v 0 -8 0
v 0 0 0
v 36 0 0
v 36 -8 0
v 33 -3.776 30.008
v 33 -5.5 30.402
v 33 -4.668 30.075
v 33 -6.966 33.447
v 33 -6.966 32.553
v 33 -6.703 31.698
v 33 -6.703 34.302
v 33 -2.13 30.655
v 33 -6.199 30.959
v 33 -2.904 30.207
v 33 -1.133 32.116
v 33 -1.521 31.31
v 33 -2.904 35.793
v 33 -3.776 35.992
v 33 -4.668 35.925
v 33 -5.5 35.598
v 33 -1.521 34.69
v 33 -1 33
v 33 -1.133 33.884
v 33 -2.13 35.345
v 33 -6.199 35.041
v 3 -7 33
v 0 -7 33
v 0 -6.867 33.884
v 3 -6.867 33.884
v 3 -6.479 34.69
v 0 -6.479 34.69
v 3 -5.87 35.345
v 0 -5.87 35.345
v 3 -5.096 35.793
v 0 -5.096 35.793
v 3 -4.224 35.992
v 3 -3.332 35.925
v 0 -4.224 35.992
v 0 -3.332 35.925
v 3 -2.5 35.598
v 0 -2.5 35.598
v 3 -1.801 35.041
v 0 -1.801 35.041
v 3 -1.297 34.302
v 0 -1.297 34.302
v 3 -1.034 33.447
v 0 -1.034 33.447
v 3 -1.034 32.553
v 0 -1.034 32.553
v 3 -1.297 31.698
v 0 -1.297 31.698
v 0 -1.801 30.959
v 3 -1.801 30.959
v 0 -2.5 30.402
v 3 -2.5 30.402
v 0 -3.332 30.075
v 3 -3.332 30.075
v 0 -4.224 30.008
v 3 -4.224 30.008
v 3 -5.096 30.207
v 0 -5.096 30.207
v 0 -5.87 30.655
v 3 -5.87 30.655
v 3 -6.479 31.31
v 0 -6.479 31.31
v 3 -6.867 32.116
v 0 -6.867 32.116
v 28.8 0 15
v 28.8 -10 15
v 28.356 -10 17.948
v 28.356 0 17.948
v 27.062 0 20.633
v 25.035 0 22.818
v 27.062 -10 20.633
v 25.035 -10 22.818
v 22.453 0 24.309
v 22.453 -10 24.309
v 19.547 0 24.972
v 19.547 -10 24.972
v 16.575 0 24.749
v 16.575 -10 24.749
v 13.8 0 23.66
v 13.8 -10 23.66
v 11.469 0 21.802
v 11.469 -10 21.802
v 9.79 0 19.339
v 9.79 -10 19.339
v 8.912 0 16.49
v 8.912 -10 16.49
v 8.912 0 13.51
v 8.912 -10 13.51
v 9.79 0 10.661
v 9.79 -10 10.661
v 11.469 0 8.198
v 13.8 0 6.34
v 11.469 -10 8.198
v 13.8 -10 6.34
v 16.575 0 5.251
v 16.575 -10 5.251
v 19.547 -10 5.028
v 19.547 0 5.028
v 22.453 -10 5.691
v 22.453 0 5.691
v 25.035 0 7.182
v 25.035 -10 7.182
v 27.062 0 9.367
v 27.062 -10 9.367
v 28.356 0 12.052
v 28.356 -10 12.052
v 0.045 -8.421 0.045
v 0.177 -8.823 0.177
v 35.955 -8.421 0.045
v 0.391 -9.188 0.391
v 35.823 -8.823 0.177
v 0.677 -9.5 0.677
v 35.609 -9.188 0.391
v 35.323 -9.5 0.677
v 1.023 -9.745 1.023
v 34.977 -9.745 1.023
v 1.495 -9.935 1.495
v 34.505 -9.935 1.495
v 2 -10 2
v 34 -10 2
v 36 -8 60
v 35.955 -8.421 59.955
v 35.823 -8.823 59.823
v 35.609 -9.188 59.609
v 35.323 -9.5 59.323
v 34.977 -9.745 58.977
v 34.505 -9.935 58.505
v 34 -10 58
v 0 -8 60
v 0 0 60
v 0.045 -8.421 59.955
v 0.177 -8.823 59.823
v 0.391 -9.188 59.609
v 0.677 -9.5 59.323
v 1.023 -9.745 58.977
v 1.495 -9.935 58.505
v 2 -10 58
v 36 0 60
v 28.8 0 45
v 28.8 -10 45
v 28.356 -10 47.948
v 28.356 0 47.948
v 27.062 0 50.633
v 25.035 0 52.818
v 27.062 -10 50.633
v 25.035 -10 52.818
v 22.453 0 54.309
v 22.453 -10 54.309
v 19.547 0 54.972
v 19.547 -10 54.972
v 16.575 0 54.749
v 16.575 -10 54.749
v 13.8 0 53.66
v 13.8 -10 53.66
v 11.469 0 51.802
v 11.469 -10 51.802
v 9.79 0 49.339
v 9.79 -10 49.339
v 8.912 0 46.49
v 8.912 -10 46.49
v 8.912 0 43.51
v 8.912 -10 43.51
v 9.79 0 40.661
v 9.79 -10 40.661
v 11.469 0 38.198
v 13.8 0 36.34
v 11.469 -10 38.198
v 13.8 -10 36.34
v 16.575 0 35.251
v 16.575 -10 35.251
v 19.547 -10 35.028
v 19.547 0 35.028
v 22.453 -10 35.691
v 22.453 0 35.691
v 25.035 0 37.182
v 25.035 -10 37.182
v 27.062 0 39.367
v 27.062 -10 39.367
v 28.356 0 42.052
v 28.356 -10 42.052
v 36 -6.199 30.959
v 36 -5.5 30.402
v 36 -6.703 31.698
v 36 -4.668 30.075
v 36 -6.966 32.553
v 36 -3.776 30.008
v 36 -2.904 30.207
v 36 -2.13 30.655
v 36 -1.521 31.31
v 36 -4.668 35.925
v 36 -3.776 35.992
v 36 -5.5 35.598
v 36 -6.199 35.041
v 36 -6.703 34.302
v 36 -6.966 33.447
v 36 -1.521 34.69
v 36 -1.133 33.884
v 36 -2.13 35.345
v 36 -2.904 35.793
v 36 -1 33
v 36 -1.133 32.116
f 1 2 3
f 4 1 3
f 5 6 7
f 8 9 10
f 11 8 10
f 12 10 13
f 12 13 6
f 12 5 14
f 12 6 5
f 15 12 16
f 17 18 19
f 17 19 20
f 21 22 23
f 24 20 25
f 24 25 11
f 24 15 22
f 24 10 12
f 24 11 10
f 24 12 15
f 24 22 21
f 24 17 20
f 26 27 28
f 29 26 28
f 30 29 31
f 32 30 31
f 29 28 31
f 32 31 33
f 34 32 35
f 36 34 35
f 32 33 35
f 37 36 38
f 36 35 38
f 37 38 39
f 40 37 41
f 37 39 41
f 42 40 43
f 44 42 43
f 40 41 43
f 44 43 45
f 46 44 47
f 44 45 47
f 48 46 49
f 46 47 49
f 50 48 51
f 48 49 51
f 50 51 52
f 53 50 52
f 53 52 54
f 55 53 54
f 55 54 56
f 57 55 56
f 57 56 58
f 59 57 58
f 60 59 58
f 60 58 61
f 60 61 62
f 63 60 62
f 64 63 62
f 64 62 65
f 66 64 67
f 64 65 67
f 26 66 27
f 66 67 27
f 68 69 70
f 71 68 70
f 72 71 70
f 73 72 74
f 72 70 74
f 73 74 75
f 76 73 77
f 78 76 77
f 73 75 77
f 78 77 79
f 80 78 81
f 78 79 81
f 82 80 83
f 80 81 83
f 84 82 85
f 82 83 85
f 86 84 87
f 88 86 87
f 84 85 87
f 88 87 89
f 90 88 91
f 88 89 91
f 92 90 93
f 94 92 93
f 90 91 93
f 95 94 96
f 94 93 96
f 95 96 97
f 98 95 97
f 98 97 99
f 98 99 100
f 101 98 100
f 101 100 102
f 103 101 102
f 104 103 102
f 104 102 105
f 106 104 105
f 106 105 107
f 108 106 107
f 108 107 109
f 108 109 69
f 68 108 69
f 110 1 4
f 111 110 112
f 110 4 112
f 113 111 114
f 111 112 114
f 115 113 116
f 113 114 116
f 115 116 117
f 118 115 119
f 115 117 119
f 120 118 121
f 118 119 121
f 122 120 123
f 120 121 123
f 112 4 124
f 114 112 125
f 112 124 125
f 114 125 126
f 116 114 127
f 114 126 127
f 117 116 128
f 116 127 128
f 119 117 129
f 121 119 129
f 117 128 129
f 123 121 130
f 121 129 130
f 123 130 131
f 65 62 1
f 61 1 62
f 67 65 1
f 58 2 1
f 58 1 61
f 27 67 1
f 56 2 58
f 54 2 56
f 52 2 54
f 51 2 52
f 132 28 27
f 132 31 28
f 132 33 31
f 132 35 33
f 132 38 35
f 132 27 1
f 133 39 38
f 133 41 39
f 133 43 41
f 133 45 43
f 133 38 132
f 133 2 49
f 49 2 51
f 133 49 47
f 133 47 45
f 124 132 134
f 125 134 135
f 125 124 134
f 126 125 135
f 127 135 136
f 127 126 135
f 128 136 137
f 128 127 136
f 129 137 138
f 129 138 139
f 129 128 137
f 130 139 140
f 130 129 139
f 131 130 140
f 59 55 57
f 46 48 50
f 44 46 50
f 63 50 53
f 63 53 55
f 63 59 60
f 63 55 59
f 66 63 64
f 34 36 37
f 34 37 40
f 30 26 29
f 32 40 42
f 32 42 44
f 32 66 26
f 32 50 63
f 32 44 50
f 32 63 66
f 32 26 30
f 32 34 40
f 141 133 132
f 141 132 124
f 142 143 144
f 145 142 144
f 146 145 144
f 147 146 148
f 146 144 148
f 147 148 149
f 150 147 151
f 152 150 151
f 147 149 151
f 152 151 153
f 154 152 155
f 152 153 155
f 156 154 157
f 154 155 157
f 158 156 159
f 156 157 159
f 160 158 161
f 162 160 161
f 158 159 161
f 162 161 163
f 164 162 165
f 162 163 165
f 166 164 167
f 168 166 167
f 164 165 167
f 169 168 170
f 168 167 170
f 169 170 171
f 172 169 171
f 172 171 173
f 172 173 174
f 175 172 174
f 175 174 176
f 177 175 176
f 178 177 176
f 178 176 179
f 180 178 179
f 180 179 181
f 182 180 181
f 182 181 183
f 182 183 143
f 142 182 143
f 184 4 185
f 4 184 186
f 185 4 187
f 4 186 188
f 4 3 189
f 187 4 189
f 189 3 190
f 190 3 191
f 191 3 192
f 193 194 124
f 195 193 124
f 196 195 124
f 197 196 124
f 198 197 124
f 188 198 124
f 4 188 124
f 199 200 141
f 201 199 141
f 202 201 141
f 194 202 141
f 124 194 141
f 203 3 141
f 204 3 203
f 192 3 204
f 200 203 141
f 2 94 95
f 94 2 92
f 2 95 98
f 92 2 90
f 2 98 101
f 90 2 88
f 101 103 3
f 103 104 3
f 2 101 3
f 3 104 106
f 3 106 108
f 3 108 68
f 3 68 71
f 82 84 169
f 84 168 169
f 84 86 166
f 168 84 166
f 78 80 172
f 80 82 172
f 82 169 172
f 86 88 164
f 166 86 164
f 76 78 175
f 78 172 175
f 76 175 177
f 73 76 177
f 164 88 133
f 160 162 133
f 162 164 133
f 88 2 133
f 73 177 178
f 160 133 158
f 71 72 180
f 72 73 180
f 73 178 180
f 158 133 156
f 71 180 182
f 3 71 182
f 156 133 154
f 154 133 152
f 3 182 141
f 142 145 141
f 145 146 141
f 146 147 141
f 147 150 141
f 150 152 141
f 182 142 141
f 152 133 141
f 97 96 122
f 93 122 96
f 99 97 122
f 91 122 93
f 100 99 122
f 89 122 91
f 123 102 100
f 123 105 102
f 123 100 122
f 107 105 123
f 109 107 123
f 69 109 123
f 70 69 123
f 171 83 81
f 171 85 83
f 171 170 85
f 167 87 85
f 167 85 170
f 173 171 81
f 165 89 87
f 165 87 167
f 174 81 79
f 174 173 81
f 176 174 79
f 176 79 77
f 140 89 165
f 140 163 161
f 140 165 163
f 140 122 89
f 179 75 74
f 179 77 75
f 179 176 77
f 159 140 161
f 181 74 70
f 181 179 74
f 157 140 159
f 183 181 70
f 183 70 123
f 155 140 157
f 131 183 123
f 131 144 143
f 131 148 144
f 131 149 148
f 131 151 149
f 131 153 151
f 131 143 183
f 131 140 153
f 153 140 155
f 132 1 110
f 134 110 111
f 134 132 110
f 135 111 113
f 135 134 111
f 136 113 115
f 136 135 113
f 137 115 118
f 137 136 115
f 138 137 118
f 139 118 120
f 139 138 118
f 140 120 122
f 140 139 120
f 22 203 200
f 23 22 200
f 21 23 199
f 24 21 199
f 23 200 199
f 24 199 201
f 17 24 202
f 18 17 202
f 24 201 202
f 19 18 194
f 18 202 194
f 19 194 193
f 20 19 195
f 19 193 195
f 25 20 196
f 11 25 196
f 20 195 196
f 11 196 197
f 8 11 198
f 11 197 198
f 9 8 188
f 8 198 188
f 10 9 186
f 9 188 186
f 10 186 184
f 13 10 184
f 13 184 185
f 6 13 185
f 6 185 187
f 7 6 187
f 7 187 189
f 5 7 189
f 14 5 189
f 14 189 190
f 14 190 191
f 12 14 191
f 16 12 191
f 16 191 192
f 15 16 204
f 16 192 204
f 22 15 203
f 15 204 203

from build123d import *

# Parameters (mm, degrees)
F0_W     = 36
F0_H     = 60
F1_DEPTH = 10
F2_R     = 2
F3_R     = 10
F4_DEPTH = 25
F5_R     = 3
F6_DEPTH = 3
F7_R     = 3
F8_DEPTH = 3


with BuildPart() as f1:
    # F0 (on Front) → F1 (new body)
    with BuildSketch(Plane.XZ):
        with Locations((18, 30)):
            Rectangle(F0_W, F0_H)
    extrude(amount=F1_DEPTH)

    # F2
    f2_edges = [f1.edges().sort_by_distance(p)[0] for p in [
        (0, -10, 30),
        (18, -10, 0),
        (36, -10, 30),
        (18, -10, 60),
    ]]
    fillet(f2_edges, radius=F2_R)

    # F3 (on face) → F4 (cut)
    with BuildSketch(Plane.XZ.offset(10)):
        with Locations((18.8, 15)):
            Circle(F3_R)
        with Locations((18.8, 45)):
            Circle(F3_R)
    extrude(amount=-F4_DEPTH, mode=Mode.SUBTRACT)

    # F5 (on face) → F6 (cut)
    with BuildSketch(Plane.YZ.offset(36)):
        with Locations((-4, 33)):
            Circle(F5_R)
    extrude(amount=-F6_DEPTH, mode=Mode.SUBTRACT)

    # F7 (on face) → F8 (cut)
    with BuildSketch(Plane(origin=(0, 0, 0), x_dir=(0, -1, 0), z_dir=(-1, 0, 0))):
        with Locations((4, 33)):
            Circle(F7_R)
    extrude(amount=-F8_DEPTH, mode=Mode.SUBTRACT)


solid = f1.part
